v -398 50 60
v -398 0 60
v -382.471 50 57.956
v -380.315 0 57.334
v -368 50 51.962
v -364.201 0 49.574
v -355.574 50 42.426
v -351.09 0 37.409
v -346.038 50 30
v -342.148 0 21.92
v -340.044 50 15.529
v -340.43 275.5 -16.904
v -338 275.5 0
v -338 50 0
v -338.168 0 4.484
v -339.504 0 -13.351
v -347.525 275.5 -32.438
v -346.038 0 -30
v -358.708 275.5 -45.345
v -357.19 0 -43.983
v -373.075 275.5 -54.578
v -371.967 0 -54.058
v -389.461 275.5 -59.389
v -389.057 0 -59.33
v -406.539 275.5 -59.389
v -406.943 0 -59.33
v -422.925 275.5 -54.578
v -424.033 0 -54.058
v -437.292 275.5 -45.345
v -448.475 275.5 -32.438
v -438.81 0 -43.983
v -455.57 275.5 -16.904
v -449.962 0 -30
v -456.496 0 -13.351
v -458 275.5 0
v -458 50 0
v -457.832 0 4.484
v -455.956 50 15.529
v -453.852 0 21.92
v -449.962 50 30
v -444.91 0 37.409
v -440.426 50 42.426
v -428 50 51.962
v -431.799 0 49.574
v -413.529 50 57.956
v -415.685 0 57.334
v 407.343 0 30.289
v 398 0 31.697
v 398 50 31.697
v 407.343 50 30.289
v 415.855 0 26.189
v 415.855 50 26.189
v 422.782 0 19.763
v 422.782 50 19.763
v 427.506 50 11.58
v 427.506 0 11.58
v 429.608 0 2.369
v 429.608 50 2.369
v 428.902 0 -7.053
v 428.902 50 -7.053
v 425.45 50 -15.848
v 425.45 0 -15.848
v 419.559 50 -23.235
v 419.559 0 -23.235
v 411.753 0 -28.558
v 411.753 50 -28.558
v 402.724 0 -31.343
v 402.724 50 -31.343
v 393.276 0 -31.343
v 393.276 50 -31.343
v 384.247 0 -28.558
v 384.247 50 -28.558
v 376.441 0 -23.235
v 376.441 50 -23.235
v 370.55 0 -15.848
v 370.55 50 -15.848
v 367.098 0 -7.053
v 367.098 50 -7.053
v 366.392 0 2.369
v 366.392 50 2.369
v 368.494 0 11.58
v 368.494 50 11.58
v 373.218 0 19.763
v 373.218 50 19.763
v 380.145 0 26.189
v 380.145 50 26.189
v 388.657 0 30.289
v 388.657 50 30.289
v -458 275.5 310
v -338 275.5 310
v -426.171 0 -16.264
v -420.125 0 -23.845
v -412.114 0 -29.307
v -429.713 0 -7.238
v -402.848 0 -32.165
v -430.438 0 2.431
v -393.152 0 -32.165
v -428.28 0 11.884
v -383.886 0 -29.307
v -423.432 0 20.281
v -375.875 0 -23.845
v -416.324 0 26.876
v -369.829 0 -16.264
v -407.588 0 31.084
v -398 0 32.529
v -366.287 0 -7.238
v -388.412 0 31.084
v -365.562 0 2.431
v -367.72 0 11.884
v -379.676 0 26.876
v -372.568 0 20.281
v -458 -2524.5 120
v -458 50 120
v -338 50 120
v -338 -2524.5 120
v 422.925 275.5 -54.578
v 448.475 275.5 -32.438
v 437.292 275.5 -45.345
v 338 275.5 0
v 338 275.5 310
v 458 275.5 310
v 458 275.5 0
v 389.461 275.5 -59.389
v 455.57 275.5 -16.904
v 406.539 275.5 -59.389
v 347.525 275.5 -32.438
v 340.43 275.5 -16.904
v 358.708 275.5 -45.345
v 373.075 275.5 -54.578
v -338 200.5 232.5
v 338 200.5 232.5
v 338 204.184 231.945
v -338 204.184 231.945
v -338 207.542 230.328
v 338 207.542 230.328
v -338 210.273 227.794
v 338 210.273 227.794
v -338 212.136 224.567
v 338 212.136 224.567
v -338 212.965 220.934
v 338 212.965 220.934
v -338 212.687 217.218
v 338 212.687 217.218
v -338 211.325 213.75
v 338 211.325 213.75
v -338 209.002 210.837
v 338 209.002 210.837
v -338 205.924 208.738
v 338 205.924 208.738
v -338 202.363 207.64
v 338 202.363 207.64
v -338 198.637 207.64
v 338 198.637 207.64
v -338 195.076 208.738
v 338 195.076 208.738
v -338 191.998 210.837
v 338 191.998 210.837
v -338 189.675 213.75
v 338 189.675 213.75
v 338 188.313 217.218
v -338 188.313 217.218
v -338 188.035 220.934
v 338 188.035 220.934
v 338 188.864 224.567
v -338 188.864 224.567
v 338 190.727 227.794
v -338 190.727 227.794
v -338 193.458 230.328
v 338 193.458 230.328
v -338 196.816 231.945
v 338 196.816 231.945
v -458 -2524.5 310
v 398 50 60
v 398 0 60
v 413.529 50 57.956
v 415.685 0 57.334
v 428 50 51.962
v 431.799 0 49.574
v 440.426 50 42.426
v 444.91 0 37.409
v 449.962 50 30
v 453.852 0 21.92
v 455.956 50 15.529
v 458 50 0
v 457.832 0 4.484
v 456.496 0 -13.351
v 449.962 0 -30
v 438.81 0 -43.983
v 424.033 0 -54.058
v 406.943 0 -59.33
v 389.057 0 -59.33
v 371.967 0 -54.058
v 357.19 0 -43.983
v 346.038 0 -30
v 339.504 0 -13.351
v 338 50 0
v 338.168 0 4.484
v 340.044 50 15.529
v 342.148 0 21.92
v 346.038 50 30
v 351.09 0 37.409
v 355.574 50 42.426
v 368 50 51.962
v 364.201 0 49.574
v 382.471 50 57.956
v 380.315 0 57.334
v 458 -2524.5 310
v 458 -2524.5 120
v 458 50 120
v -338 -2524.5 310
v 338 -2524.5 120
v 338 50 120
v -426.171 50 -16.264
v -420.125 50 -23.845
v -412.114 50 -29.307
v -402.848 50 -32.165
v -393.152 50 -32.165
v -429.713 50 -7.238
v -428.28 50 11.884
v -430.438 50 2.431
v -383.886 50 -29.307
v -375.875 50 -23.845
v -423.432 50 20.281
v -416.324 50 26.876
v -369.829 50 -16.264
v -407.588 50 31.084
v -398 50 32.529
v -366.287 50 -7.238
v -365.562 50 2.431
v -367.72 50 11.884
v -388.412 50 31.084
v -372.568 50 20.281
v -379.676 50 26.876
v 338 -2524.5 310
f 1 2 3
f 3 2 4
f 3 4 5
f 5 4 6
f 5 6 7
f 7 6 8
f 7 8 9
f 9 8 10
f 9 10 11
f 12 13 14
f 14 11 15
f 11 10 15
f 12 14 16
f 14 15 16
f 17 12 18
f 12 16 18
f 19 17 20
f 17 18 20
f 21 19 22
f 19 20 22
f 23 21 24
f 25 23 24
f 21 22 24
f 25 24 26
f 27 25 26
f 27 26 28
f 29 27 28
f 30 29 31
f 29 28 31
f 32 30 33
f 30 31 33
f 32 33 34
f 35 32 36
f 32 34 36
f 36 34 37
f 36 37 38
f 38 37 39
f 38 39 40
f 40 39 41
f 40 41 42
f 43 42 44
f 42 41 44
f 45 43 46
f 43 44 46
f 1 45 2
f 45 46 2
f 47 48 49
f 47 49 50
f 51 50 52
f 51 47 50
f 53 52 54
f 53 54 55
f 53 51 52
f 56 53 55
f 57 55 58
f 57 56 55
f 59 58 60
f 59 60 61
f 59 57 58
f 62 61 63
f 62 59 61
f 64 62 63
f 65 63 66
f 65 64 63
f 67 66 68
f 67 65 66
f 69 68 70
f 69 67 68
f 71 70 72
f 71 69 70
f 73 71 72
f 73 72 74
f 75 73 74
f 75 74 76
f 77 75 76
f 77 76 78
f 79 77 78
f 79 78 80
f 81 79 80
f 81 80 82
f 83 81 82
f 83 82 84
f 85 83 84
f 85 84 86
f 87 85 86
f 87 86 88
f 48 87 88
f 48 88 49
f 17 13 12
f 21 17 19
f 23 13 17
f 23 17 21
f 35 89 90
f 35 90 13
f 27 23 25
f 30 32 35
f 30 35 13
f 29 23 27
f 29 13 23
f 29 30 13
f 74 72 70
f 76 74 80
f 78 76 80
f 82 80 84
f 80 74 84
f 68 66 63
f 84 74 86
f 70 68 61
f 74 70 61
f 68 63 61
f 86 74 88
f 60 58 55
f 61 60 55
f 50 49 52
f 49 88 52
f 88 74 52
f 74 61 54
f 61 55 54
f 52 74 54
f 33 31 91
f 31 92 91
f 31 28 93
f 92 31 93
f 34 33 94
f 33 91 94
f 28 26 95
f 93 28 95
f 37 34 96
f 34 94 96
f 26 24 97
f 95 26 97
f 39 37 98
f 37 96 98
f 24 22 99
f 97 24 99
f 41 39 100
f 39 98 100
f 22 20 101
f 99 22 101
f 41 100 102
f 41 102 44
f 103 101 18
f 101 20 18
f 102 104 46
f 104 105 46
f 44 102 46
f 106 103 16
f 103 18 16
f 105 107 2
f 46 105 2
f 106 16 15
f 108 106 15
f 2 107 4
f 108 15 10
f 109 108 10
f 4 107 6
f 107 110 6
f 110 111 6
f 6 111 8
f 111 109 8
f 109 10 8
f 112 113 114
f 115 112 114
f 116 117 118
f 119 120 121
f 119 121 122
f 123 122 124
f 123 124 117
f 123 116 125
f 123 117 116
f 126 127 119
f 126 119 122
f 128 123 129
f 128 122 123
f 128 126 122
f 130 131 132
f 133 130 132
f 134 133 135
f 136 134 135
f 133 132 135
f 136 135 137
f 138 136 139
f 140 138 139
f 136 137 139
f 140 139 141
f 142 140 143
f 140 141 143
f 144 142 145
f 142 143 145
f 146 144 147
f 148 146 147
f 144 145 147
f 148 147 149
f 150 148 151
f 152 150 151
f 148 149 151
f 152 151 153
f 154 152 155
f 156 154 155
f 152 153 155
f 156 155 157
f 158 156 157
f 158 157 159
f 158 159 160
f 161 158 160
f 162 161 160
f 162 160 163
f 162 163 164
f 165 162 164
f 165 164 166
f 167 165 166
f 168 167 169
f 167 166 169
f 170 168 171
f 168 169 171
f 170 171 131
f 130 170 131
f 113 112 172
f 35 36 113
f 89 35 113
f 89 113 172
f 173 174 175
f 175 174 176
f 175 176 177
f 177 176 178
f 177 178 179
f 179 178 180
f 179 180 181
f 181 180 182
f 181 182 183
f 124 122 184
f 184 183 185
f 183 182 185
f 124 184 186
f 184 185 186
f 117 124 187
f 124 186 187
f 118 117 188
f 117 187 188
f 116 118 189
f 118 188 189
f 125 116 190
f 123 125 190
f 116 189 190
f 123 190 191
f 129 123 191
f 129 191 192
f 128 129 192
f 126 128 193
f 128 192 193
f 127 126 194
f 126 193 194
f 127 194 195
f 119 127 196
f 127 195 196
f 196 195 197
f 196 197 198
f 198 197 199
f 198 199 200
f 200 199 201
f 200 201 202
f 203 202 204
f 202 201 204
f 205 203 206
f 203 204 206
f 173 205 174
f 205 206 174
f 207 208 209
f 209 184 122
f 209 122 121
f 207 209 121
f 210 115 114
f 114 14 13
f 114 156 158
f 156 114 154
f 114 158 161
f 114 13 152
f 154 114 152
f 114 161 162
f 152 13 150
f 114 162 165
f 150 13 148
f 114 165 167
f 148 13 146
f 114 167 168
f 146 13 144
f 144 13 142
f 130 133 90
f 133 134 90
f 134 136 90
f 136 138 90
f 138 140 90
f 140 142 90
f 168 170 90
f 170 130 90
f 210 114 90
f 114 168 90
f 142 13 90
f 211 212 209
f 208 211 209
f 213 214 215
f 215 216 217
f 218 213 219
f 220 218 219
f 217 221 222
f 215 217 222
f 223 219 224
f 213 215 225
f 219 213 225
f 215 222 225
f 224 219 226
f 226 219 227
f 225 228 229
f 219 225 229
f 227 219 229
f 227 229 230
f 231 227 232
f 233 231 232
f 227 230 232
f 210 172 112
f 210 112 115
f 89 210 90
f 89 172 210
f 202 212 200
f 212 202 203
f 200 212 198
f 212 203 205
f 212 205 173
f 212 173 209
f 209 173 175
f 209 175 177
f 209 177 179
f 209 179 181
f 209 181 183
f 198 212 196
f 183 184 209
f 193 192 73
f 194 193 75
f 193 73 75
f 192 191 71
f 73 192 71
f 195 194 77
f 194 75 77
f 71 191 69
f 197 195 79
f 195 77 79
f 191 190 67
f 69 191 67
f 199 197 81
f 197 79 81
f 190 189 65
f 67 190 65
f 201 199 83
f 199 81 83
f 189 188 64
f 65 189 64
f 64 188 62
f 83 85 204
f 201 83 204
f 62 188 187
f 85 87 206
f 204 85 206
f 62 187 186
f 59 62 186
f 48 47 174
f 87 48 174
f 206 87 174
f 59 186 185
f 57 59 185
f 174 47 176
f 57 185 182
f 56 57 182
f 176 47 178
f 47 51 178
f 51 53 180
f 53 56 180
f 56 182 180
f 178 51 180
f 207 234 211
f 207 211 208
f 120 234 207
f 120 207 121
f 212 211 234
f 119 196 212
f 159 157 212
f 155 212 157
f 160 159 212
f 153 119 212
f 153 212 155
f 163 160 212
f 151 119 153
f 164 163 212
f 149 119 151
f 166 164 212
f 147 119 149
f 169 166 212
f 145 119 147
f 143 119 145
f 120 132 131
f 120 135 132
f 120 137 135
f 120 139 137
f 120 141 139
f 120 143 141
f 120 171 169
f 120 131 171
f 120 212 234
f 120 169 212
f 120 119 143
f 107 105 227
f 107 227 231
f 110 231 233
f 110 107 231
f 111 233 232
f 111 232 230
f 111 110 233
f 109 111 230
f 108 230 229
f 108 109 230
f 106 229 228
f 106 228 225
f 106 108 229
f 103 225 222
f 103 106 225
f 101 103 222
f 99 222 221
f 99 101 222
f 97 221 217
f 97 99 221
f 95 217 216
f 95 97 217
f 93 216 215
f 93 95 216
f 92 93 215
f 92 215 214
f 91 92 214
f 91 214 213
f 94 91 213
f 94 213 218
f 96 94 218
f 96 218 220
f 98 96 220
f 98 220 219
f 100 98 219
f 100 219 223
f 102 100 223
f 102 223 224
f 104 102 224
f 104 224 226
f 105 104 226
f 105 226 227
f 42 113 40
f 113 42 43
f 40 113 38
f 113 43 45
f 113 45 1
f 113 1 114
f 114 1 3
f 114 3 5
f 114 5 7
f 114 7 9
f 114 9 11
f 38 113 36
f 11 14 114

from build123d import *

# Parameters (mm, degrees)
SKETCH1_R             = 60
SKETCH1_R_2           = 32.528667591
BOSS_EXTRUDE1_DEPTH   = 50
SKETCH1_R_3           = 31.696746535
BOSS_EXTRUDE1_2_DEPTH = 50
SKETCH2_R             = 60
BOSS_EXTRUDE2_DEPTH   = 225.5
SKETCH5_W             = 120
SKETCH5_H             = 225.5
BOSS_EXTRUDE3_DEPTH   = 310
SKETCH6_W             = 120
SKETCH6_H             = 190
BOSS_EXTRUDE4_DEPTH   = 2574.5
SKETCH7_W             = 190
SKETCH7_H             = 225.5
BOSS_EXTRUDE5_DEPTH   = 676
SKETCH9_W             = 190
SKETCH9_H             = 225.5
SKETCH9_R             = 12.5
CUT_EXTRUDE1_DEPTH    = 676


with BuildPart() as part:
    # Sketch1 → Boss-Extrude1 (new body)
    with BuildSketch(Plane(origin=(0, 0, 0), x_dir=(1, 0, 0), z_dir=(0, 1, 0))):
        with Locations(Location((-398, 0, 0), (0, 0, 270))):
            Circle(SKETCH1_R)
        with Locations(Location((-398, 0, 0), (0, 0, 270))):
            Circle(SKETCH1_R_2, mode=Mode.SUBTRACT)
    extrude(amount=BOSS_EXTRUDE1_DEPTH)



with BuildPart() as body_2:
    # Sketch1 → Boss-Extrude1 2 (new body)
    with BuildSketch(Plane(origin=(0, 0, 0), x_dir=(1, 0, 0), z_dir=(0, 1, 0))):
        with Locations(Location((398, 0, 0), (0, 0, 270))):
            Circle(SKETCH1_R)
        with Locations(Location((398, 0, 0), (0, 0, 270))):
            Circle(SKETCH1_R_3, mode=Mode.SUBTRACT)
    extrude(amount=BOSS_EXTRUDE1_2_DEPTH)


with BuildPart() as part_1:
    add(part.part)

    add(body_2.part)  # Boss-Extrude2 merges body 2
    # Sketch2 → Boss-Extrude2 (add)
    with BuildSketch(Plane(origin=(0, 50, 0), x_dir=(1, 0, 0), z_dir=(0, 1, 0))):
        with Locations(Location((398, 0, 0), (0, 0, 270))):
            Circle(SKETCH2_R)
        with Locations(Location((-398, 0, 0), (0, 0, 270))):
            Circle(SKETCH2_R)
    extrude(amount=BOSS_EXTRUDE2_DEPTH)

    # Sketch5 → Boss-Extrude3 (add)
    with BuildSketch(Plane.XY):
        with Locations((-398, 162.75)):
            Rectangle(SKETCH5_W, SKETCH5_H)
        with Locations((398, 162.75)):
            Rectangle(SKETCH5_W, SKETCH5_H)
    extrude(amount=BOSS_EXTRUDE3_DEPTH)

    # Sketch6 → Boss-Extrude4 (add)
    with BuildSketch(Plane.XZ.offset(-50)):
        with Locations((398, 215)):
            Rectangle(SKETCH6_W, SKETCH6_H)
        with Locations((-398, 215)):
            Rectangle(SKETCH6_W, SKETCH6_H)
    extrude(amount=BOSS_EXTRUDE4_DEPTH)

    # Sketch7 → Boss-Extrude5 (add)
    with BuildSketch(Plane(origin=(-338, 0, 0), x_dir=(0, 0, -1), z_dir=(1, 0, 0))):
        with Locations((-215, 162.75)):
            Rectangle(SKETCH7_W, SKETCH7_H)
    extrude(amount=BOSS_EXTRUDE5_DEPTH)

    # Sketch9 → Cut-Extrude1 (cut)
    with BuildSketch(Plane.ZY.offset(-338)):
        with Locations((215, 162.75)):
            Rectangle(SKETCH9_W, SKETCH9_H)
        with Locations((220, 200.5)):
            Circle(SKETCH9_R, mode=Mode.SUBTRACT)
    extrude(amount=CUT_EXTRUDE1_DEPTH, mode=Mode.SUBTRACT)


solid = part_1.part
